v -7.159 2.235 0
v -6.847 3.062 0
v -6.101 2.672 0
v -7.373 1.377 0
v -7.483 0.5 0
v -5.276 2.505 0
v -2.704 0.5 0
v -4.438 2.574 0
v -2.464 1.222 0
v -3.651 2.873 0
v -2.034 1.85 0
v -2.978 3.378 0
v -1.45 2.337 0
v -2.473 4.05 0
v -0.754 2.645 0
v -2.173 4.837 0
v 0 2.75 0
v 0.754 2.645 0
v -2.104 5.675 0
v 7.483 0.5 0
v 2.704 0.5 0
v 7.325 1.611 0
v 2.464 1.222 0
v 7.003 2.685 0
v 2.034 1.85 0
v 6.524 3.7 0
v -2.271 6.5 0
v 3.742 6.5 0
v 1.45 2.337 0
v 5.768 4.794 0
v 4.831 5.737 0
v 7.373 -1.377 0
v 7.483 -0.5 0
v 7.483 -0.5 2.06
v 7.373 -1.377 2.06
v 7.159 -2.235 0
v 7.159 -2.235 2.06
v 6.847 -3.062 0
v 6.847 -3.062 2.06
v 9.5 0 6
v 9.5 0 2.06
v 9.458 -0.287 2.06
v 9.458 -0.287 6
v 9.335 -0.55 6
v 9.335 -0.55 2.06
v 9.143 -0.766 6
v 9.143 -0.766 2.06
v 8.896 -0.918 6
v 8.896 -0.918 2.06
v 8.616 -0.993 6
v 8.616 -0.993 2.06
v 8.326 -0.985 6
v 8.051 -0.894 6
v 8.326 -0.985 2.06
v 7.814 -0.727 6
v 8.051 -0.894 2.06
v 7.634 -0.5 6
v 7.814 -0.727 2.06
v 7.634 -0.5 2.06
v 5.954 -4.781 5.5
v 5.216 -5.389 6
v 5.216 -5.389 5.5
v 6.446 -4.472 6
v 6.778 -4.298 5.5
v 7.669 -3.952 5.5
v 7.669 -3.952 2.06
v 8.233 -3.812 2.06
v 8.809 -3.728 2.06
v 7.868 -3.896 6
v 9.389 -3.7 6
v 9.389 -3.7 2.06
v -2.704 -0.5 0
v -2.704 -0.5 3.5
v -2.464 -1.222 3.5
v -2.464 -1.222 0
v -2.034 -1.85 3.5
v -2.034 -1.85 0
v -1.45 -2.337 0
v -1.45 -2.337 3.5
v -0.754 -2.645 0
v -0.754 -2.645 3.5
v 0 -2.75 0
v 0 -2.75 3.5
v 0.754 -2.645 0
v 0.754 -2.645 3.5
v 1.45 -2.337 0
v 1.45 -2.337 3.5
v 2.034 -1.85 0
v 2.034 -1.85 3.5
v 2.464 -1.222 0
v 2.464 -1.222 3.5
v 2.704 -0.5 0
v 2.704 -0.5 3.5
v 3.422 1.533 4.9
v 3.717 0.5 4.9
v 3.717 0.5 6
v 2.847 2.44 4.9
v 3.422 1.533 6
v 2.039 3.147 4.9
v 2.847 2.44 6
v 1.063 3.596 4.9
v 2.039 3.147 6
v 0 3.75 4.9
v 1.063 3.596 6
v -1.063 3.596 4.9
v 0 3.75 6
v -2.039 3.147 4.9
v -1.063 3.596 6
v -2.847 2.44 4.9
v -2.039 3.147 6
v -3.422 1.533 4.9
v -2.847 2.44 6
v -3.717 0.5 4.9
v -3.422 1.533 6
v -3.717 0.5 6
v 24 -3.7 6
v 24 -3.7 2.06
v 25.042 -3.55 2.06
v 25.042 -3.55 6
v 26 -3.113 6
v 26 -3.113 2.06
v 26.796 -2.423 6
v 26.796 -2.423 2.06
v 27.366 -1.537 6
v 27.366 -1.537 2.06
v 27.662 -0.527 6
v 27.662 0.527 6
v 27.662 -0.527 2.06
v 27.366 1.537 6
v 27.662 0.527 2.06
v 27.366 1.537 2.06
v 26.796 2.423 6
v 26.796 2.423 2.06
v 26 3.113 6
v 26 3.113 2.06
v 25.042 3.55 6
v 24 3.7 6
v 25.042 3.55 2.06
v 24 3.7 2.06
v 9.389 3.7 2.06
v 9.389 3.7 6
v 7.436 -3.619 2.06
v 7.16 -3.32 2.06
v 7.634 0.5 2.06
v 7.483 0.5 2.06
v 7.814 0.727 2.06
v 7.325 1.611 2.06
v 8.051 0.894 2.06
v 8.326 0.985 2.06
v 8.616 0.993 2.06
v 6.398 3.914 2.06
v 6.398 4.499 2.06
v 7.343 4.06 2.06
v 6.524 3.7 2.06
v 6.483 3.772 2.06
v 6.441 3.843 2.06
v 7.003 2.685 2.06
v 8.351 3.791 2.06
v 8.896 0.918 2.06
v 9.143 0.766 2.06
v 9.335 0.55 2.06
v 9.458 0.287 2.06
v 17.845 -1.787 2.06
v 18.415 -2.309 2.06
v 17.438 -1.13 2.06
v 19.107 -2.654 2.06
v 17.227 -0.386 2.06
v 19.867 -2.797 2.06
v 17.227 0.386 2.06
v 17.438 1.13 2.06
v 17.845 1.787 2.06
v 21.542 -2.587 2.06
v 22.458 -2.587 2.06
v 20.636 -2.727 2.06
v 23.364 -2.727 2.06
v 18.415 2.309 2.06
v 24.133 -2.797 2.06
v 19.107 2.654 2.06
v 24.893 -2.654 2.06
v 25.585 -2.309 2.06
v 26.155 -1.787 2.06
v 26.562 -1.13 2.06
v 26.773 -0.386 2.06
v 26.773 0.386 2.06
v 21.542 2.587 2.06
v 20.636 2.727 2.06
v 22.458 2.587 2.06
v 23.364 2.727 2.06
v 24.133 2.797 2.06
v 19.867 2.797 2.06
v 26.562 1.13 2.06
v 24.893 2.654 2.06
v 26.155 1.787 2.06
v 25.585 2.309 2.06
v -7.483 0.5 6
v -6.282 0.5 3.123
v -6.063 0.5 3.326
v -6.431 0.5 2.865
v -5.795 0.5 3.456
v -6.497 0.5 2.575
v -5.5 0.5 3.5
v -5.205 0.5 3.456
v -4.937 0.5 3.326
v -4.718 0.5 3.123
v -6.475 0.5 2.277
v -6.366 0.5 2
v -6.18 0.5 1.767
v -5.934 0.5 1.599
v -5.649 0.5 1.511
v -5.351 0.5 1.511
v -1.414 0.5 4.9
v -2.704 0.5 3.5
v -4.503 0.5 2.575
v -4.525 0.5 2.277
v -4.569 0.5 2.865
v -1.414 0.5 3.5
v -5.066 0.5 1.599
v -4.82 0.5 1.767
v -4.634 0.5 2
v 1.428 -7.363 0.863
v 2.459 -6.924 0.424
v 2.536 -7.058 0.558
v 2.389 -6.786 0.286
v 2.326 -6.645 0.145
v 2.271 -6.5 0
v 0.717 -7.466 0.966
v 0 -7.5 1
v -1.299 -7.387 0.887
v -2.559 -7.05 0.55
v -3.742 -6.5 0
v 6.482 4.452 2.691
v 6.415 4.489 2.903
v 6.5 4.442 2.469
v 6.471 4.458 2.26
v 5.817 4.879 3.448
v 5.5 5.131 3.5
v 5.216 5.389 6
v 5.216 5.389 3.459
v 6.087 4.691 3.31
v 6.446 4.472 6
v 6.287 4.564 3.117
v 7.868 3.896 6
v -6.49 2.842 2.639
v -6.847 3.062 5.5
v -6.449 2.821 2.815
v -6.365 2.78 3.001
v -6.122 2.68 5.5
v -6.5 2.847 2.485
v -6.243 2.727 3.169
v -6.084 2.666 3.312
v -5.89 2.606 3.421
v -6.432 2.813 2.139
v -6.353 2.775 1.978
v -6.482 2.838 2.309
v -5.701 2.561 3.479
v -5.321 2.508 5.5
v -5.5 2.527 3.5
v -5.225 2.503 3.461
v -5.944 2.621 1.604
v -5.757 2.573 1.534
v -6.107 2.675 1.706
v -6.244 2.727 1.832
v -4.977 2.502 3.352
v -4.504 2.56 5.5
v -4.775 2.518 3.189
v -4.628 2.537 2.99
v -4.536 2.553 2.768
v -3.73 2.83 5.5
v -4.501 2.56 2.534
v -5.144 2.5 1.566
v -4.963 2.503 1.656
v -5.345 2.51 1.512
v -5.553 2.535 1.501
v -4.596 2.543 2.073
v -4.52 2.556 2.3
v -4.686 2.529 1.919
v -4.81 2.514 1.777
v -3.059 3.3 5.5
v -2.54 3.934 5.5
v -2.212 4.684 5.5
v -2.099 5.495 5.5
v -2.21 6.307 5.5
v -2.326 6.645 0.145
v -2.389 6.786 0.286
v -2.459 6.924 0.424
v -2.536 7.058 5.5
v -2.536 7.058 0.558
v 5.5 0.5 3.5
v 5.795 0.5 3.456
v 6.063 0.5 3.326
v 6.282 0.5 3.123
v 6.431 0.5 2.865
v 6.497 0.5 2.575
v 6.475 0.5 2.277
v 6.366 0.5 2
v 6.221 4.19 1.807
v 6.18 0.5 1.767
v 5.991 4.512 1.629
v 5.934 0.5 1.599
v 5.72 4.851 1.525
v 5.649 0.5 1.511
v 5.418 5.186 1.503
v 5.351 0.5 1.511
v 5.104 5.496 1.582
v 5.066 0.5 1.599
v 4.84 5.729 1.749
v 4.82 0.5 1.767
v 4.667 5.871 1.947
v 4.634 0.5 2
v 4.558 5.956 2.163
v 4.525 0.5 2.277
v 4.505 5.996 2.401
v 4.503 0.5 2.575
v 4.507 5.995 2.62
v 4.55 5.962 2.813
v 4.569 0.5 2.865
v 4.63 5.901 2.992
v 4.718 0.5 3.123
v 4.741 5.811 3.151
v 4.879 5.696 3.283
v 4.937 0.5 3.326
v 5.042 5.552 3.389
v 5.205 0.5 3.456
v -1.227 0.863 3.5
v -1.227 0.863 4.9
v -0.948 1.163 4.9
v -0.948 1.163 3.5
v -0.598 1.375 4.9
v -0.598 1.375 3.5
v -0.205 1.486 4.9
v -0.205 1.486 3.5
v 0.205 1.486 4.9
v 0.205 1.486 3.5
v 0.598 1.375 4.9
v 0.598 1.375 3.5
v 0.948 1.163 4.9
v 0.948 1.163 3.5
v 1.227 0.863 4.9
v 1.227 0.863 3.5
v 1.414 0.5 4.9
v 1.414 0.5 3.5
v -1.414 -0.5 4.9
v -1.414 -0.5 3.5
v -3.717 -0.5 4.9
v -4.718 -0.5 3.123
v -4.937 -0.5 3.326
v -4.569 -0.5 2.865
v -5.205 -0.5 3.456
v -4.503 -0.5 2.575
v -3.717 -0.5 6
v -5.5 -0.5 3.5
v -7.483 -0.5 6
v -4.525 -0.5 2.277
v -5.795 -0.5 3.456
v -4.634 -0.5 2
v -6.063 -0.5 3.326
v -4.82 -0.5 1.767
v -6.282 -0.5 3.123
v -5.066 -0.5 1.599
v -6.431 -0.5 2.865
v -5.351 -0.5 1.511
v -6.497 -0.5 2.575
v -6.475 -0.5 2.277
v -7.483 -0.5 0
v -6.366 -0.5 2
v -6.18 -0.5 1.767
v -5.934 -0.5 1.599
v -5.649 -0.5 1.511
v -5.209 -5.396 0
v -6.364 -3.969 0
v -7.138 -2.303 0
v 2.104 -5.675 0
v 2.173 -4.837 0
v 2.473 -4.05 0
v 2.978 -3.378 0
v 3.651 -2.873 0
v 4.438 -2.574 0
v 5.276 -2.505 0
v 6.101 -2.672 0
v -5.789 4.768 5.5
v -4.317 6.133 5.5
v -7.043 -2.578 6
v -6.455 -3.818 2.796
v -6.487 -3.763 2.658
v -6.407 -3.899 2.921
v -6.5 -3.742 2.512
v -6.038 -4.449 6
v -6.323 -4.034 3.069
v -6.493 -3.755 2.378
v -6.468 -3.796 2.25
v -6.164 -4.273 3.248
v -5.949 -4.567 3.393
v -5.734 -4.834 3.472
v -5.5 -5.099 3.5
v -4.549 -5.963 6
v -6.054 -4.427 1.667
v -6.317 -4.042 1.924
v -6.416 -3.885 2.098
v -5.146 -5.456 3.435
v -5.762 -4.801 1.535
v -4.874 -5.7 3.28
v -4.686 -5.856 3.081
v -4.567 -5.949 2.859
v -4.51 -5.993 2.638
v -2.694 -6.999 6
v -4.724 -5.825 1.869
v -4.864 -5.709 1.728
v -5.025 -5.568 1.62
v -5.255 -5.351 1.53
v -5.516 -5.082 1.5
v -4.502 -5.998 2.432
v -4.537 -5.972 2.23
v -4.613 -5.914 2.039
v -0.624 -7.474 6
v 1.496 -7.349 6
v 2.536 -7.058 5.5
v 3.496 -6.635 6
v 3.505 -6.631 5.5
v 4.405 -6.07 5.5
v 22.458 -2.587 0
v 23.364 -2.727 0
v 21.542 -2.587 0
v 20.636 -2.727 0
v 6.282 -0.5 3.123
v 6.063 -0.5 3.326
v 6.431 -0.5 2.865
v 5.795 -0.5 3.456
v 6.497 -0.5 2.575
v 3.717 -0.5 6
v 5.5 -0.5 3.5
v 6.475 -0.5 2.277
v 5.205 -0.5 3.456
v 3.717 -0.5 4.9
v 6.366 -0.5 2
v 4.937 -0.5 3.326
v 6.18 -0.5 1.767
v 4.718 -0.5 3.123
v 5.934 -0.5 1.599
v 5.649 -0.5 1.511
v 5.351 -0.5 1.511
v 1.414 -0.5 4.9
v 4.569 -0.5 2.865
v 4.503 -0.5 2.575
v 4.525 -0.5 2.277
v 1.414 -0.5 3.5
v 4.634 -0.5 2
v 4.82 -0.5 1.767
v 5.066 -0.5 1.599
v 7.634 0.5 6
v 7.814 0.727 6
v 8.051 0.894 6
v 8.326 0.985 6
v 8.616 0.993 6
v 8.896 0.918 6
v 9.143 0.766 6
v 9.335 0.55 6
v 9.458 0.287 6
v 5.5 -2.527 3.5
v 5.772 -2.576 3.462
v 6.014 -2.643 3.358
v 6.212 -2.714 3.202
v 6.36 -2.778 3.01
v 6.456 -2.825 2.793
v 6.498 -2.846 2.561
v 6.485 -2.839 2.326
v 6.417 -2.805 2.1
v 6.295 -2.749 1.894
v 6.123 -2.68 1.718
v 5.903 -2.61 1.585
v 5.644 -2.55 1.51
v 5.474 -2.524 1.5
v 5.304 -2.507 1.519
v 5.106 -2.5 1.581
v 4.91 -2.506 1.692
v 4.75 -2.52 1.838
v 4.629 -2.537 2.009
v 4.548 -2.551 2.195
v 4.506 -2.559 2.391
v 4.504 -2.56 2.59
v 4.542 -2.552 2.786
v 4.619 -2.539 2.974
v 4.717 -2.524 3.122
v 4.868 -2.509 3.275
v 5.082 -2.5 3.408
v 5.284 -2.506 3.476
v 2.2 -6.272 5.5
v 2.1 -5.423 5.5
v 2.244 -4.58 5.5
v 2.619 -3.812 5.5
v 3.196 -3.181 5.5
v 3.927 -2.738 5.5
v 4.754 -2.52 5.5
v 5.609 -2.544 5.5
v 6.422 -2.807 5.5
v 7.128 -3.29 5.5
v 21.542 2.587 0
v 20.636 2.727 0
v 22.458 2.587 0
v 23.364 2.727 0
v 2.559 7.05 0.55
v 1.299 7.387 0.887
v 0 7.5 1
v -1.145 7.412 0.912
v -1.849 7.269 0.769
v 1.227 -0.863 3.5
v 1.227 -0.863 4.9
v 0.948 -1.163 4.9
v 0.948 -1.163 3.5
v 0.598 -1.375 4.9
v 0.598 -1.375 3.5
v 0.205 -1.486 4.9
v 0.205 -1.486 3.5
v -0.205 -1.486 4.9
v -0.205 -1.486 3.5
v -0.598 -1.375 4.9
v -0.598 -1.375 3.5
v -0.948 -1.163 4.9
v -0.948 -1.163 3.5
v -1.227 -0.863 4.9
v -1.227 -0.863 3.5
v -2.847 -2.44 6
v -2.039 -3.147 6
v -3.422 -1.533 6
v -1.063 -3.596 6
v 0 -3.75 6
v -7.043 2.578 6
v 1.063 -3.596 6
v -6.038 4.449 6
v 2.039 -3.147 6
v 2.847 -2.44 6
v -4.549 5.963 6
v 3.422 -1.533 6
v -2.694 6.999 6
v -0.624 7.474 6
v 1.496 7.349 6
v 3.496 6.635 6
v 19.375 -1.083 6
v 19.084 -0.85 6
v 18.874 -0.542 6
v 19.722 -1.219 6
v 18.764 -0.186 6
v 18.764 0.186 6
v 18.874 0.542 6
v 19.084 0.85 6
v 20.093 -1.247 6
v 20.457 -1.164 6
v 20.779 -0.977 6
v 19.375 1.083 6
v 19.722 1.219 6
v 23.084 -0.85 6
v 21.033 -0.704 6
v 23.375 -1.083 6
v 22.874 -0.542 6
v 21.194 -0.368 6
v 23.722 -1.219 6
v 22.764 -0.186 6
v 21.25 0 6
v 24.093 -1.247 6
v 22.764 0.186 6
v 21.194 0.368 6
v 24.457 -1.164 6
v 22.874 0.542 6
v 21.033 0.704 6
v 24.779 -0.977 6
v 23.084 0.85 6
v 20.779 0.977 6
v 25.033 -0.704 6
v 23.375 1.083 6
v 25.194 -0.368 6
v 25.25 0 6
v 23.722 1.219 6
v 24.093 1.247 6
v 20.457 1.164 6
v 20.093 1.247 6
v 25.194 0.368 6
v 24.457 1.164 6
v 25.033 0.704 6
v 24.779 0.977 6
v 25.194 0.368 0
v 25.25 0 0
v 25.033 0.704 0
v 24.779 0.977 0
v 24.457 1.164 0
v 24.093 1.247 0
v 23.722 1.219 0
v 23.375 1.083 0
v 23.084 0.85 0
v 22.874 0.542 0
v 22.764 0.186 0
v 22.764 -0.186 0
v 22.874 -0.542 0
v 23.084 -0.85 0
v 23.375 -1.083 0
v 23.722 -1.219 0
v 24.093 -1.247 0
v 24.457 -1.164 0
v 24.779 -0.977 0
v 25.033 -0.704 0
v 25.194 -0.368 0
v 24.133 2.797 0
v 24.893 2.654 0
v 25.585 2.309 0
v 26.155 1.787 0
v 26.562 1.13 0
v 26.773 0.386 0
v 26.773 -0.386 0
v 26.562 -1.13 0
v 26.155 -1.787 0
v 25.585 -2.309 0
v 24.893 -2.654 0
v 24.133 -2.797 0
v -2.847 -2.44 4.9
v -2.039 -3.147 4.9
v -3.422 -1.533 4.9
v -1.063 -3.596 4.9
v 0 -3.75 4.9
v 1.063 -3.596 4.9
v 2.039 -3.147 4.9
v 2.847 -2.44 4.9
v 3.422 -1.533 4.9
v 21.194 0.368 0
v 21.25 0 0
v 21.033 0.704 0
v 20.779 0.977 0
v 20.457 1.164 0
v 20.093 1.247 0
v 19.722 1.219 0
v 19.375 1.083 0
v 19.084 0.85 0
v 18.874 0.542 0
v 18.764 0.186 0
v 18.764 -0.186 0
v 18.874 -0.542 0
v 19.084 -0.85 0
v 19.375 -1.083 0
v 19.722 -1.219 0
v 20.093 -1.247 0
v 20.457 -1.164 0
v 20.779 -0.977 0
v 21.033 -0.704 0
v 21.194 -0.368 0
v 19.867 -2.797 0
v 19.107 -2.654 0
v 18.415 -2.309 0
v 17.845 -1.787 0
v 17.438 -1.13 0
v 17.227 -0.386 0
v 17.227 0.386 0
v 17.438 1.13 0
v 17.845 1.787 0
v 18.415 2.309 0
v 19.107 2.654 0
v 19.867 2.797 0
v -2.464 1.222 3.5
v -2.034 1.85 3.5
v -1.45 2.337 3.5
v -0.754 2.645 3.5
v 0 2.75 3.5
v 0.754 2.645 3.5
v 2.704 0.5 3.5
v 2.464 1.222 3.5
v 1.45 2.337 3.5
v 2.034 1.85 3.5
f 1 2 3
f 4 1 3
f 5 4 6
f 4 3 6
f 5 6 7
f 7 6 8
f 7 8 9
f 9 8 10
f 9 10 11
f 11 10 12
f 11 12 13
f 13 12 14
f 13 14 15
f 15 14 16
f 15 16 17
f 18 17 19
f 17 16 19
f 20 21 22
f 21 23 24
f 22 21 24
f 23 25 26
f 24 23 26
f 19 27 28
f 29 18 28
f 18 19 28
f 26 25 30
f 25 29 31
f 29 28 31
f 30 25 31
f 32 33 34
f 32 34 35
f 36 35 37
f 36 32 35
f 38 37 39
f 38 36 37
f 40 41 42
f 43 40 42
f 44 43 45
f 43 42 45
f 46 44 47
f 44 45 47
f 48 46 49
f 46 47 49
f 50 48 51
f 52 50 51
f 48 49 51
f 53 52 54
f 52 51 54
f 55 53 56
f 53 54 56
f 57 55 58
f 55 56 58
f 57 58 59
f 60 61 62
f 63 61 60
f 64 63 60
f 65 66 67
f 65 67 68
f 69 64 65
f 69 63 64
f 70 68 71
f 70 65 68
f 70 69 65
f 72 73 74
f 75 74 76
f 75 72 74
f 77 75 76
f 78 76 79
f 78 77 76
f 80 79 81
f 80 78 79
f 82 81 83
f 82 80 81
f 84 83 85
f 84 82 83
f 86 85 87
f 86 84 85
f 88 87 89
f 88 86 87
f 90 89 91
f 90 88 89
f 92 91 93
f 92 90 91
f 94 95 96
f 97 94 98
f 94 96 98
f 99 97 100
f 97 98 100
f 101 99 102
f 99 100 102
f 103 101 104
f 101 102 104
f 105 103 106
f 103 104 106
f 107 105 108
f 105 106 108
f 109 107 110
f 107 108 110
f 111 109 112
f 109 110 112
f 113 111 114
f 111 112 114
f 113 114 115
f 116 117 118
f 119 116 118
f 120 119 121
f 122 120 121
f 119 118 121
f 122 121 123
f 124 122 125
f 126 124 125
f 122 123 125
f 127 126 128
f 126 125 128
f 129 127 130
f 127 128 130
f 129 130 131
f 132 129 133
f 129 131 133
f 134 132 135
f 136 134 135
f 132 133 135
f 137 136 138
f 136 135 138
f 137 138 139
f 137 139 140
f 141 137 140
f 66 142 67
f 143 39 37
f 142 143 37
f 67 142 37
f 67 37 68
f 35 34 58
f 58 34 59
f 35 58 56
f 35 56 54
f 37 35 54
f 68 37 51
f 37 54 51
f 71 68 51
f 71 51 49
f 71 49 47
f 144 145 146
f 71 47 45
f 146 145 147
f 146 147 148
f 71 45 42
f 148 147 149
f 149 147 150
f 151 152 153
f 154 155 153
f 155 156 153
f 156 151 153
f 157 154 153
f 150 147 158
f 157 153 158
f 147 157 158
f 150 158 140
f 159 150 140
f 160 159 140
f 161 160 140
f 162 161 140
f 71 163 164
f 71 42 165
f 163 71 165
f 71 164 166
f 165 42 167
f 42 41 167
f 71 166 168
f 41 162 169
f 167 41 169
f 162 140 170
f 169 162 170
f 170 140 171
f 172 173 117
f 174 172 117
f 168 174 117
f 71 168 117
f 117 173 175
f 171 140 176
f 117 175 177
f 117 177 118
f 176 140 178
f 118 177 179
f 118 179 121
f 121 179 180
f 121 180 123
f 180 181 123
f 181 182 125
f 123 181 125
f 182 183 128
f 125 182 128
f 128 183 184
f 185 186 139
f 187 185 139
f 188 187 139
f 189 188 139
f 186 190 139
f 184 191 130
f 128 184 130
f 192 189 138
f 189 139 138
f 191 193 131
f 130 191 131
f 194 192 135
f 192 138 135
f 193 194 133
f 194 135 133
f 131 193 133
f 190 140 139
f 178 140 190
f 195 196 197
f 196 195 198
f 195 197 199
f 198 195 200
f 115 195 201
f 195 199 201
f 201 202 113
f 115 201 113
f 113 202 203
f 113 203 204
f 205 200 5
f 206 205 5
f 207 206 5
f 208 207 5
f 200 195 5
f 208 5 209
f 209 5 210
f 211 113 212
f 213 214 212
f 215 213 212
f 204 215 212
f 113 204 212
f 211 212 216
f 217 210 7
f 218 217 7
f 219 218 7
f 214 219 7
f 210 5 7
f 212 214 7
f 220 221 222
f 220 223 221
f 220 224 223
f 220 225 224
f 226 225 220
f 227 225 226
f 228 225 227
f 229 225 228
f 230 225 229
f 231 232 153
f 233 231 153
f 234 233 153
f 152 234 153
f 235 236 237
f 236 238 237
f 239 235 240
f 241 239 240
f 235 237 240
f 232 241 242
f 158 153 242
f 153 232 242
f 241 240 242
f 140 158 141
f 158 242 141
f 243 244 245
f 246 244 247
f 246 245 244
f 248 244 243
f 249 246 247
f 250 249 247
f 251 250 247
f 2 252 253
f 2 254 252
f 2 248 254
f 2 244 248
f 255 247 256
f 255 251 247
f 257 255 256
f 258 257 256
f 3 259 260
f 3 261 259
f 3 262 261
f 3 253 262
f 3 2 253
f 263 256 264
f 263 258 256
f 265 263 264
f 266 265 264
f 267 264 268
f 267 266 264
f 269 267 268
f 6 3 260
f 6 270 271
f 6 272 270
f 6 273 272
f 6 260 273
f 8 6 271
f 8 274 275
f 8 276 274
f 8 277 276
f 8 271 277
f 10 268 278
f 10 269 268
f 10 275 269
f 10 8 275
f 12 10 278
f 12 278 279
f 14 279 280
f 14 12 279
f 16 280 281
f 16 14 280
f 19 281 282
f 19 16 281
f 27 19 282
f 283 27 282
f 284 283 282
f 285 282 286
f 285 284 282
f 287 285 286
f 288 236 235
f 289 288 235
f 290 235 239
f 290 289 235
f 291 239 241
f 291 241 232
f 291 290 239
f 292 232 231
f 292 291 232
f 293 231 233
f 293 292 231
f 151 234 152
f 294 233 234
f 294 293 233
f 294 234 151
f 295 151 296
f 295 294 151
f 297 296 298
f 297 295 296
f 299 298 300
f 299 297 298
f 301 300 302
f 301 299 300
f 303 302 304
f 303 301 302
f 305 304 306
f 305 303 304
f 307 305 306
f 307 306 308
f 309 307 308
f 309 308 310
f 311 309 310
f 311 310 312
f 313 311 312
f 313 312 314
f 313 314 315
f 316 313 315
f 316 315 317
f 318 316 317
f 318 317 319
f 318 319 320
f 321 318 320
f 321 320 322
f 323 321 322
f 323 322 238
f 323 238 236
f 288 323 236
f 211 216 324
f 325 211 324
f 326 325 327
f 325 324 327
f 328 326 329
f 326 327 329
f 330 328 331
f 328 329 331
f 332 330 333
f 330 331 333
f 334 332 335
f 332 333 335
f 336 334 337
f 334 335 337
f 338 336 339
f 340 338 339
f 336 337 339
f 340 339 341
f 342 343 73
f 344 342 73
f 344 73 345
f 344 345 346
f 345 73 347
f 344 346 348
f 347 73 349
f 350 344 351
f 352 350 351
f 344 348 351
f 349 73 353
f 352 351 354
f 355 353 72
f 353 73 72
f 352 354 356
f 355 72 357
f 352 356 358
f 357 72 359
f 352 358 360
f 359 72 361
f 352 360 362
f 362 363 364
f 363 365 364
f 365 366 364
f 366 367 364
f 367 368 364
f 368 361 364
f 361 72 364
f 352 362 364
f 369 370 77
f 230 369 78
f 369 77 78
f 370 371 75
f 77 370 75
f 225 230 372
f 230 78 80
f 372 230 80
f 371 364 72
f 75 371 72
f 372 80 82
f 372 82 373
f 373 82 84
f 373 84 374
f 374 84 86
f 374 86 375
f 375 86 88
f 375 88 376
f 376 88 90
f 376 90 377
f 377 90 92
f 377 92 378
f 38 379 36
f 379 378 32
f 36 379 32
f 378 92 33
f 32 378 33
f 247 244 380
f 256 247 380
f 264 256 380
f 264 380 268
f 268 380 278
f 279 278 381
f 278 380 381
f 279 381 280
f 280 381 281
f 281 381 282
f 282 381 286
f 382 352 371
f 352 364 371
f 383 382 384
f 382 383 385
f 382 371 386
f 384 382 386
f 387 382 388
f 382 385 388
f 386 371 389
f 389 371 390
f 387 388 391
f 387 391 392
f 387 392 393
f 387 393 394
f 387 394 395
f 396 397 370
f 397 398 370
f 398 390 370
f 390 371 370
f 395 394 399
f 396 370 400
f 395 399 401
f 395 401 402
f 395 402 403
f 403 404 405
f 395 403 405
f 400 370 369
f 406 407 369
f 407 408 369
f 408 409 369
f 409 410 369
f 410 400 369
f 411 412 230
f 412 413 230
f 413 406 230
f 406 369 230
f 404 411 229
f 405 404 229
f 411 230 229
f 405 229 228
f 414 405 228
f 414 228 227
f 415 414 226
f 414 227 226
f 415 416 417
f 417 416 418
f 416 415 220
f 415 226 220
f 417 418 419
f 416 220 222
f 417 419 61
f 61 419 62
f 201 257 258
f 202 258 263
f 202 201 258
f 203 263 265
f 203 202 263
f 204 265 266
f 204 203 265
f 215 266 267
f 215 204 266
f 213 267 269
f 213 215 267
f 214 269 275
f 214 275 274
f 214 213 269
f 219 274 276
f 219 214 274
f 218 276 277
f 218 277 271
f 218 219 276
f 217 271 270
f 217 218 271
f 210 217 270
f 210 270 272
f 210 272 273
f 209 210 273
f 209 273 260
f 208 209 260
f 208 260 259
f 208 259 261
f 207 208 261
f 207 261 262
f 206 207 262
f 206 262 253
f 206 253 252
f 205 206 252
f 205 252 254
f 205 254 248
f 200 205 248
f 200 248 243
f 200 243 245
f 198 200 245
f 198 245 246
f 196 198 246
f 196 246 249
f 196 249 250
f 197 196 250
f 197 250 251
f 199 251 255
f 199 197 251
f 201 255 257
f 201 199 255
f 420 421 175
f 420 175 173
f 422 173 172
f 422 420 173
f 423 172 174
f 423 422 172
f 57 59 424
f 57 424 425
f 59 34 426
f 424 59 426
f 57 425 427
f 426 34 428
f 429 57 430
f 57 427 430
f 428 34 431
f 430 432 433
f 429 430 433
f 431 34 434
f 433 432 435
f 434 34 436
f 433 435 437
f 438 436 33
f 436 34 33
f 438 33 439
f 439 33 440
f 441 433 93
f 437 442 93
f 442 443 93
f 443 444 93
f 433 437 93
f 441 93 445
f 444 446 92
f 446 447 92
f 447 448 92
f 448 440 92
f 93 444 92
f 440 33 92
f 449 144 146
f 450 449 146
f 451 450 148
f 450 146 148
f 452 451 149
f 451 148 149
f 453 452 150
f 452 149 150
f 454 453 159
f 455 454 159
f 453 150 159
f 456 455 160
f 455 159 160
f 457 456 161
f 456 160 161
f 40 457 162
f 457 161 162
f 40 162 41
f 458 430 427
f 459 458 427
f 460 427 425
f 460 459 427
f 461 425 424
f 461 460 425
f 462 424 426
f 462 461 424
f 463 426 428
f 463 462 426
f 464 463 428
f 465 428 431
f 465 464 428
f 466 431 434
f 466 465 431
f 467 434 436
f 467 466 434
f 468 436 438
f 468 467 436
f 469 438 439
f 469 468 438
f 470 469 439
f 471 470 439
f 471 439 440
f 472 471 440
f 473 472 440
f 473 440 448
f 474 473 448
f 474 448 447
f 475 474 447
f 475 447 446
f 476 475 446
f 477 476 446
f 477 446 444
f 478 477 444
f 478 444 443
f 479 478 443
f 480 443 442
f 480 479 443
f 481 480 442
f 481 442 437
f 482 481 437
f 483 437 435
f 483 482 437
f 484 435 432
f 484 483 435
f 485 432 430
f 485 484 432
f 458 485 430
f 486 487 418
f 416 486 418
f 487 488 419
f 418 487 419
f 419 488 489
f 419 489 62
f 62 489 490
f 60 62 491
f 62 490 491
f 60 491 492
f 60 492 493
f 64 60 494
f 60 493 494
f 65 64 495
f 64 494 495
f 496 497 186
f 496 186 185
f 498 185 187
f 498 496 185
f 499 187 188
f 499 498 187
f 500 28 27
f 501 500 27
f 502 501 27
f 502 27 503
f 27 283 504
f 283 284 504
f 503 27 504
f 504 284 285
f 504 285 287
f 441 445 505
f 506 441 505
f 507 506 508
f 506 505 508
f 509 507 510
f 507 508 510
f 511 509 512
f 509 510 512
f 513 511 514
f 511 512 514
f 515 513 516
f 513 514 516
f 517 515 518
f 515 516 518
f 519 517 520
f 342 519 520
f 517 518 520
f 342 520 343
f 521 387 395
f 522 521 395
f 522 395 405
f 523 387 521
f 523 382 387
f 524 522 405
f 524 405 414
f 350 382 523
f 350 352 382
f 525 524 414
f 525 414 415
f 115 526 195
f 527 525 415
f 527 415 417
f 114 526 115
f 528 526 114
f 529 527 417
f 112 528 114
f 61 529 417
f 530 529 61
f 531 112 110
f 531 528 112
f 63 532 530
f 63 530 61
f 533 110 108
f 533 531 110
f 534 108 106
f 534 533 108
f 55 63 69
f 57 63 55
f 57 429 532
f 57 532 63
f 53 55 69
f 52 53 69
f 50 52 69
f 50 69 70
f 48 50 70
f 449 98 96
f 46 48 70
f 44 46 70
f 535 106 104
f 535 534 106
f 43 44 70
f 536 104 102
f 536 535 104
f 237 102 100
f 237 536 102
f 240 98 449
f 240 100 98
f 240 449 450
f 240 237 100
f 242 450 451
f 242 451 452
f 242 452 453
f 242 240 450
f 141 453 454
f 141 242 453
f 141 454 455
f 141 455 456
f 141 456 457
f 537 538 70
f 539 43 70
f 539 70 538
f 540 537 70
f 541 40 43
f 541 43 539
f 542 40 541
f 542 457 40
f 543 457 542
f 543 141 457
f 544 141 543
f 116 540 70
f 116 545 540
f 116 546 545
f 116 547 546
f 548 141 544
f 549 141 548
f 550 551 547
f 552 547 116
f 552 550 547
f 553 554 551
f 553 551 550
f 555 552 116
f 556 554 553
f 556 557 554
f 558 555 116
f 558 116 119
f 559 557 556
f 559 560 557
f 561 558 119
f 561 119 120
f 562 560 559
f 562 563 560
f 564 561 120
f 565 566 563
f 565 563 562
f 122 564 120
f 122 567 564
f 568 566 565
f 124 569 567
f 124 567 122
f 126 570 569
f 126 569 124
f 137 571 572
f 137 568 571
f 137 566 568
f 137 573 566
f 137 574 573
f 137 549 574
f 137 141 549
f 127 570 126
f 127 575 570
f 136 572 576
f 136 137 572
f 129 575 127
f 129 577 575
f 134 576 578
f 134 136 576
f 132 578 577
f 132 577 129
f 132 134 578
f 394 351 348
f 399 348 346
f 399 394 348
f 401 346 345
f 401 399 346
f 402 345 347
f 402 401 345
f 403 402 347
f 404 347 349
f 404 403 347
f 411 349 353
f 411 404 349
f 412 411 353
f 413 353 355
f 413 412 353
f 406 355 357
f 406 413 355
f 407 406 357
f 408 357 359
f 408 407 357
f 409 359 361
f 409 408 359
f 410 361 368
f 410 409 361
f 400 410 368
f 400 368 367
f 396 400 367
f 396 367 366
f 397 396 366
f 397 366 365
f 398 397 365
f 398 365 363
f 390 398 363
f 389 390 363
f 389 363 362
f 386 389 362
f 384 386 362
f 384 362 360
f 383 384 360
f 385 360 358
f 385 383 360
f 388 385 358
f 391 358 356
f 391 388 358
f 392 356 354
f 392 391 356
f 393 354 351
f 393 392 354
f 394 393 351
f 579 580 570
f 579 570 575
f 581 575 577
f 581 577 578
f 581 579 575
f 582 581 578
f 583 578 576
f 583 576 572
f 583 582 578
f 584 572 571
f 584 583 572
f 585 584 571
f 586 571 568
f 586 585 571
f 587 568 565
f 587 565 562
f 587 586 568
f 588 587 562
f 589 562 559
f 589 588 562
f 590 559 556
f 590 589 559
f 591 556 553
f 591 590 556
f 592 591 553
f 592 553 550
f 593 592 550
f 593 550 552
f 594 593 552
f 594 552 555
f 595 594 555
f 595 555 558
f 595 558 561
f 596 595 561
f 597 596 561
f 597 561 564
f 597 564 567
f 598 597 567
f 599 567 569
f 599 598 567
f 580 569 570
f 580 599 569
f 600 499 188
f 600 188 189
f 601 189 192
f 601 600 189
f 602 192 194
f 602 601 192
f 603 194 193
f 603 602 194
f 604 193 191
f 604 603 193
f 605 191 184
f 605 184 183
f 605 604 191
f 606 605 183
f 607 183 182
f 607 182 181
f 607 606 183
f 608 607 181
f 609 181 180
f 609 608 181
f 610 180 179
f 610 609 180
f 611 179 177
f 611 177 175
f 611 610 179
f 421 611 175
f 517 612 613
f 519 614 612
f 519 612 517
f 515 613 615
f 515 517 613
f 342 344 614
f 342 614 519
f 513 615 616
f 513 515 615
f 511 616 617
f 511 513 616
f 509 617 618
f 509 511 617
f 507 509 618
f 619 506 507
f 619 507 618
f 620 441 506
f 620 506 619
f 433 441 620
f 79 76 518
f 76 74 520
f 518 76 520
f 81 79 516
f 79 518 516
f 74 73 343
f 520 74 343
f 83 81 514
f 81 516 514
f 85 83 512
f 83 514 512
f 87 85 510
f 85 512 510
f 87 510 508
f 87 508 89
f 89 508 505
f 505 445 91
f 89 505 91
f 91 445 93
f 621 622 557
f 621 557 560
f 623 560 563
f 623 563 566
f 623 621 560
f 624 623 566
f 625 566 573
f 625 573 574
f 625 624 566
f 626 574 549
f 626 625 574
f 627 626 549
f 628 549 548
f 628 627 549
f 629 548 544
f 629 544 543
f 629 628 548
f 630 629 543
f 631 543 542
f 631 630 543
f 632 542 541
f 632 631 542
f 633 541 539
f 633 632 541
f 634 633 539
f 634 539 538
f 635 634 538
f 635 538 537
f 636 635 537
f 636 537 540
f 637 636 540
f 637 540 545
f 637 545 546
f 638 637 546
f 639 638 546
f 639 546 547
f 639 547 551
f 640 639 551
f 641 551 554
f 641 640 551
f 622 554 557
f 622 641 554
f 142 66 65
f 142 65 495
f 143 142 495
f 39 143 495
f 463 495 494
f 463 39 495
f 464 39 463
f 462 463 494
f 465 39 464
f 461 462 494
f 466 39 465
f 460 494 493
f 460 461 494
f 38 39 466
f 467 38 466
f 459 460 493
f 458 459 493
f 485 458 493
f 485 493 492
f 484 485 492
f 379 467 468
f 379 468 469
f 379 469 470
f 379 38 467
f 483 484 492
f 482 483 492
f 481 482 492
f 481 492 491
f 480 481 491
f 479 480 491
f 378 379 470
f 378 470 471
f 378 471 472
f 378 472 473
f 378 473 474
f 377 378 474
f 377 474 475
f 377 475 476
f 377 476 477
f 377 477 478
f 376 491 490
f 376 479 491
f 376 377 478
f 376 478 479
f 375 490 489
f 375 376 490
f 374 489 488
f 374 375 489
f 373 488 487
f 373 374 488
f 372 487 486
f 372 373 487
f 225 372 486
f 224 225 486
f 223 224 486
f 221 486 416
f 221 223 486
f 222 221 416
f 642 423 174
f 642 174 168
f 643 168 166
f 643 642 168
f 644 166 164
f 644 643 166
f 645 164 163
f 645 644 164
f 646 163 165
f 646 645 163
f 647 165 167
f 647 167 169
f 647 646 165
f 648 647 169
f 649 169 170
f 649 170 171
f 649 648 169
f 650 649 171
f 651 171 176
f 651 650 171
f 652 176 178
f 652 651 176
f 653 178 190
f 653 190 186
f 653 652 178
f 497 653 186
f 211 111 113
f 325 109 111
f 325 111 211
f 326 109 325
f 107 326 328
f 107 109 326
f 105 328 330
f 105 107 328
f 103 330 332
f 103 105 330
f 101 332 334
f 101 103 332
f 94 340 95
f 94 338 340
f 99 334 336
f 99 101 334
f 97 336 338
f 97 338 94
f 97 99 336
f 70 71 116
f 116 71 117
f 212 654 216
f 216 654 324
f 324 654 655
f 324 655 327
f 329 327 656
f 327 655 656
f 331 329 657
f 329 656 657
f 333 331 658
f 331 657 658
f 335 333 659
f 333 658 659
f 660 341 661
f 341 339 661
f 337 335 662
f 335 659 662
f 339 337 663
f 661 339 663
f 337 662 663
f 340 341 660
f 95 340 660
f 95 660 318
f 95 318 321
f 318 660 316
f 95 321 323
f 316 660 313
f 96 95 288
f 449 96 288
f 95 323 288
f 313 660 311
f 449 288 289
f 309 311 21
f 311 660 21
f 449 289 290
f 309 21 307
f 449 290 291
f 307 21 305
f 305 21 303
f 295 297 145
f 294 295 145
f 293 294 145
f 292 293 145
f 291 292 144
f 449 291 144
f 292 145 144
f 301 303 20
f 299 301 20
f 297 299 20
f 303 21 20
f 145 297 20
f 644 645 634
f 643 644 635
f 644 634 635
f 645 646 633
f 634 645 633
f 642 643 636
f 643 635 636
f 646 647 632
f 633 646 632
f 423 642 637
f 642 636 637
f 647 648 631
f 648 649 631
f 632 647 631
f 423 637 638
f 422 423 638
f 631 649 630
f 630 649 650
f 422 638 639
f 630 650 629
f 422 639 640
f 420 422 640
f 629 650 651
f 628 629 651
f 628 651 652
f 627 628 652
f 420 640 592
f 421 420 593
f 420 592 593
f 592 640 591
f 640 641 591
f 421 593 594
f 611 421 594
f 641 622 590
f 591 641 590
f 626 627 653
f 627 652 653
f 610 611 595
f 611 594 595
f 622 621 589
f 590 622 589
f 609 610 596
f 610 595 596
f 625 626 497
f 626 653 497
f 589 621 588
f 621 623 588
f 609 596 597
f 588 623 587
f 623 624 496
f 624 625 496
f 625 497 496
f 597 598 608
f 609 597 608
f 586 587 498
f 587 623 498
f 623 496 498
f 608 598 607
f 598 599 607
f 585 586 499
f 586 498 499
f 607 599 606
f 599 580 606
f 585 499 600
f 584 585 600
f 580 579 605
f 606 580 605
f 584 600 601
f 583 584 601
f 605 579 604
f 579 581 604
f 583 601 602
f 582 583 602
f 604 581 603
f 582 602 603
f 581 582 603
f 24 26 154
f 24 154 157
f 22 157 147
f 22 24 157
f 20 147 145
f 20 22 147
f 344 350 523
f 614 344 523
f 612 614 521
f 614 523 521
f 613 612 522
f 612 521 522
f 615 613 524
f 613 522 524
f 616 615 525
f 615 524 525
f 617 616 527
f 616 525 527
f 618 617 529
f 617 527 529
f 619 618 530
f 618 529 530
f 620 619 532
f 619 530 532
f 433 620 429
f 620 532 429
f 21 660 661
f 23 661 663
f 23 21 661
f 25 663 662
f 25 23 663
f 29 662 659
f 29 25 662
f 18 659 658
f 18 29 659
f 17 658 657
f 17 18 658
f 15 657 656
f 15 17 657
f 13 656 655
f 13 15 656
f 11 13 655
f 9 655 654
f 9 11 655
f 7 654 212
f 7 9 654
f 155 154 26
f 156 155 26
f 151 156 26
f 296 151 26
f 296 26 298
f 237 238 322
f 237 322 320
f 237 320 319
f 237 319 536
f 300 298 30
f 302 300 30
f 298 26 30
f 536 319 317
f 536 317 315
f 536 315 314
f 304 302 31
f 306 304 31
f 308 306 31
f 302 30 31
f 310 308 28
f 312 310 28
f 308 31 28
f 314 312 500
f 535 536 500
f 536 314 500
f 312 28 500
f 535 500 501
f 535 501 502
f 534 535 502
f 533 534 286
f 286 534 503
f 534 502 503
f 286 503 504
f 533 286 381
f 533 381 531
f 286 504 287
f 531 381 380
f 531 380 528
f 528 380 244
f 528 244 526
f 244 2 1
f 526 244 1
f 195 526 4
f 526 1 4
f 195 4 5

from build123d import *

# Parameters (mm, degrees)
SKETCH_1_R               = 1.25
EXTRUDE_1_DEPTH          = 6
CUT_EXTRUDE_1_DEPTH      = 2.06
SKETCH_1_4_R             = 2.75
CUT_EXTRUDE_2_DEPTH      = 3.5
CUT_EXTRUDE_START        = 6
SKETCH_1_5_R             = 3.75
CUT_EXTRUDE_3_DEPTH      = 1.1
FILLET_1_R               = 6
SKETCH_2_R               = 3
CUT_EXTRUDE_4_DEPTH      = 5.5
CUT_EXTRUDE_5_DEPTH      = 30.317912613
CUT_EXTRUDE_5_DEPTH_BACK = 30.317912613
SKETCH_3_R               = 1
CUT_EXTRUDE_6_DEPTH      = 30.317912659
CUT_EXTRUDE_6_DEPTH_BACK = 30.317912659


with BuildPart() as part:
    # Эскиз1 → Бобышка-Вытянуть1 (new body)
    # profile 1 of 8: a face of its own
    with BuildSketch(Plane.XY):
        with BuildLine():
            ThreePointArc((24, -3.7), (27.7, 0), (24, 3.7))
            Line((24, 3.7), (6.523802572, 3.7))
            ThreePointArc((6.523802572, 3.7), (7.183998475, 2.154104435), (7.483314774, 0.5))
            Line((7.483314774, 0.5), (7.633974596, 0.5))
            ThreePointArc((7.633974596, 0.5), (8.758819045, 0.965925826), (9.5, 0))
            ThreePointArc((9.5, 0), (8.758819045, -0.965925826), (7.633974596, -0.5))
            Line((7.633974596, -0.5), (7.483314774, -0.5))
            ThreePointArc((7.483314774, -0.5), (7.183998475, -2.154104435), (6.523802572, -3.7))
            Line((6.523802572, -3.7), (24, -3.7))
        make_face()
        with BuildLine():
            ThreePointArc((23.363636364, 2.726727218), (26.8, 0), (23.363636364, -2.726727218))
            ThreePointArc((23.363636364, -2.726727218), (22, -2.569714114), (20.636363636, -2.726727218))
            ThreePointArc((20.636363636, -2.726727218), (17.2, 0), (20.636363636, 2.726727218))
            ThreePointArc((20.636363636, 2.726727218), (22, 2.569714114), (23.363636364, 2.726727218))
        make_face(mode=Mode.SUBTRACT)
    # profile 2 of 8: a face of its own
    with BuildSketch(Plane.XY):
        with BuildLine():
            ThreePointArc((20.636363636, 2.726727218), (22, 2.569714114), (23.363636364, 2.726727218))
            ThreePointArc((23.363636364, 2.726727218), (26.8, 0), (23.363636364, -2.726727218))
            ThreePointArc((23.363636364, -2.726727218), (22, -2.569714114), (20.636363636, -2.726727218))
            ThreePointArc((20.636363636, -2.726727218), (17.2, 0), (20.636363636, 2.726727218))
        make_face()
        with Locations((20, 0)):
            Circle(SKETCH_1_R, mode=Mode.SUBTRACT)
        with Locations((24, 0)):
            Circle(SKETCH_1_R, mode=Mode.SUBTRACT)
    # profile 3 of 8: a face of its own
    with BuildSketch(Plane.XY):
        with BuildLine():
            ThreePointArc((7.483314774, 0.5), (7.183998475, 2.154104435), (6.523802572, 3.7))
            ThreePointArc((6.523802572, 3.7), (-1.670378974, 7.311623218), (-7.483314774, 0.5))
            Line((-7.483314774, 0.5), (-3.716517187, 0.5))
            ThreePointArc((-3.716517187, 0.5), (0, 3.75), (3.716517187, 0.5))
            Line((3.716517187, 0.5), (7.483314774, 0.5))
        make_face()
    # profile 4 of 8: a face of its own
    with BuildSketch(Plane.XY):
        with BuildLine():
            ThreePointArc((3.716517187, 0.5), (0, 3.75), (-3.716517187, 0.5))
            Line((-3.716517187, 0.5), (-2.704163457, 0.5))
            ThreePointArc((-2.704163457, 0.5), (0, 2.75), (2.704163457, 0.5))
            Line((2.704163457, 0.5), (3.716517187, 0.5))
        make_face()
    # profile 5 of 8: a face of its own
    with BuildSketch(Plane.XY):
        with BuildLine():
            ThreePointArc((2.704163457, 0.5), (0, 2.75), (-2.704163457, 0.5))
            Line((-2.704163457, 0.5), (-1.414213562, 0.5))
            ThreePointArc((-1.414213562, 0.5), (0, 1.5), (1.414213562, 0.5))
            Line((1.414213562, 0.5), (2.704163457, 0.5))
        make_face()
    # profile 6 of 8: a face of its own
    with BuildSketch(Plane.XY):
        with BuildLine():
            ThreePointArc((-7.483314774, -0.5), (-1.670378974, -7.311623218), (6.523802572, -3.7))
            ThreePointArc((6.523802572, -3.7), (7.183998475, -2.154104435), (7.483314774, -0.5))
            Line((7.483314774, -0.5), (3.716517187, -0.5))
            ThreePointArc((3.716517187, -0.5), (0, -3.75), (-3.716517187, -0.5))
            Line((-3.716517187, -0.5), (-7.483314774, -0.5))
        make_face()
    # profile 7 of 8: a face of its own
    with BuildSketch(Plane.XY):
        with BuildLine():
            Line((-2.704163457, -0.5), (-3.716517187, -0.5))
            ThreePointArc((-3.716517187, -0.5), (0, -3.75), (3.716517187, -0.5))
            Line((3.716517187, -0.5), (2.704163457, -0.5))
            ThreePointArc((2.704163457, -0.5), (0, -2.75), (-2.704163457, -0.5))
        make_face()
    # profile 8 of 8: a face of its own
    with BuildSketch(Plane.XY):
        with BuildLine():
            Line((-1.414213562, -0.5), (-2.704163457, -0.5))
            ThreePointArc((-2.704163457, -0.5), (0, -2.75), (2.704163457, -0.5))
            Line((2.704163457, -0.5), (1.414213562, -0.5))
            ThreePointArc((1.414213562, -0.5), (0, -1.5), (-1.414213562, -0.5))
        make_face()
    extrude(amount=EXTRUDE_1_DEPTH)

    # Эскиз1<3> → Вырез-Вытянуть1 (cut)
    with BuildSketch(Plane.XY):
        with BuildLine():
            ThreePointArc((24, -3.7), (27.7, 0), (24, 3.7))
            Line((24, 3.7), (6.523802572, 3.7))
            ThreePointArc((6.523802572, 3.7), (7.183998475, 2.154104435), (7.483314774, 0.5))
            Line((7.483314774, 0.5), (7.633974596, 0.5))
            ThreePointArc((7.633974596, 0.5), (8.758819045, 0.965925826), (9.5, 0))
            ThreePointArc((9.5, 0), (8.758819045, -0.965925826), (7.633974596, -0.5))
            Line((7.633974596, -0.5), (7.483314774, -0.5))
            ThreePointArc((7.483314774, -0.5), (7.183998475, -2.154104435), (6.523802572, -3.7))
            Line((6.523802572, -3.7), (24, -3.7))
        make_face()
        with BuildLine():
            ThreePointArc((23.363636364, 2.726727218), (26.8, 0), (23.363636364, -2.726727218))
            ThreePointArc((23.363636364, -2.726727218), (22, -2.569714114), (20.636363636, -2.726727218))
            ThreePointArc((20.636363636, -2.726727218), (17.2, 0), (20.636363636, 2.726727218))
            ThreePointArc((20.636363636, 2.726727218), (22, 2.569714114), (23.363636364, 2.726727218))
        make_face(mode=Mode.SUBTRACT)
    extrude(amount=CUT_EXTRUDE_1_DEPTH, mode=Mode.SUBTRACT)

    # Эскиз1<4> → Вырез-Вытянуть2 (cut)
    with BuildSketch(Plane.XY):
        Circle(SKETCH_1_4_R)
    extrude(amount=CUT_EXTRUDE_2_DEPTH, mode=Mode.SUBTRACT)

    # Эскиз1<5> → Вырез-Вытянуть3 (cut)
    with BuildSketch(Plane.XY.offset(CUT_EXTRUDE_START)):
        Circle(SKETCH_1_5_R)
    extrude(amount=-CUT_EXTRUDE_3_DEPTH, mode=Mode.SUBTRACT)

    # Скругление1
    fillet_1_edges = [part.edges().sort_by_distance(p)[0] for p in [
        (6.523802572, 3.7, 4.03),
        (6.523802572, -3.7, 4.03),
    ]]
    fillet(fillet_1_edges, radius=FILLET_1_R)

    # Эскиз2 → Вырез-Вытянуть4 (cut)
    with BuildSketch(Plane.XY):
        with Locations((5.099019514, -5.5)):
            Circle(SKETCH_2_R)
        with Locations((-5.099019514, 5.5)):
            Circle(SKETCH_2_R)
    extrude(amount=CUT_EXTRUDE_4_DEPTH, mode=Mode.SUBTRACT)

    # Эскиз3 → Вырез-Вытянуть5 (cut, two sides: drawn at the far end of the back side and taken through both)
    with BuildSketch(Plane(origin=(0, 0, 0), x_dir=(1, 0, 0), z_dir=(0, 1, 0)).offset(-CUT_EXTRUDE_5_DEPTH_BACK)):
        with Locations(Location((5.5, -2.5, 0), (0, 0, 270))):
            Circle(SKETCH_3_R)
        with Locations(Location((-5.5, -2.5, 0), (0, 0, 270))):
            Circle(SKETCH_3_R)
    extrude(amount=CUT_EXTRUDE_5_DEPTH + CUT_EXTRUDE_5_DEPTH_BACK, mode=Mode.SUBTRACT)

    # Эскиз4 → Вырез-Вытянуть6 (cut, two sides: drawn at the far end of the back side and taken through both)
    with BuildSketch(Plane(origin=(0, 0, 0), x_dir=(0, 0, -1), z_dir=(1, 0, 0)).offset(-CUT_EXTRUDE_6_DEPTH_BACK)):
        Polygon((0, -6.5), (-1, -7.5), (0, -7.5), align=None)
        Polygon((0, 7.5), (0, 6.5), (-1, 7.5), align=None)
    extrude(amount=CUT_EXTRUDE_6_DEPTH + CUT_EXTRUDE_6_DEPTH_BACK, mode=Mode.SUBTRACT)


solid = part.part
